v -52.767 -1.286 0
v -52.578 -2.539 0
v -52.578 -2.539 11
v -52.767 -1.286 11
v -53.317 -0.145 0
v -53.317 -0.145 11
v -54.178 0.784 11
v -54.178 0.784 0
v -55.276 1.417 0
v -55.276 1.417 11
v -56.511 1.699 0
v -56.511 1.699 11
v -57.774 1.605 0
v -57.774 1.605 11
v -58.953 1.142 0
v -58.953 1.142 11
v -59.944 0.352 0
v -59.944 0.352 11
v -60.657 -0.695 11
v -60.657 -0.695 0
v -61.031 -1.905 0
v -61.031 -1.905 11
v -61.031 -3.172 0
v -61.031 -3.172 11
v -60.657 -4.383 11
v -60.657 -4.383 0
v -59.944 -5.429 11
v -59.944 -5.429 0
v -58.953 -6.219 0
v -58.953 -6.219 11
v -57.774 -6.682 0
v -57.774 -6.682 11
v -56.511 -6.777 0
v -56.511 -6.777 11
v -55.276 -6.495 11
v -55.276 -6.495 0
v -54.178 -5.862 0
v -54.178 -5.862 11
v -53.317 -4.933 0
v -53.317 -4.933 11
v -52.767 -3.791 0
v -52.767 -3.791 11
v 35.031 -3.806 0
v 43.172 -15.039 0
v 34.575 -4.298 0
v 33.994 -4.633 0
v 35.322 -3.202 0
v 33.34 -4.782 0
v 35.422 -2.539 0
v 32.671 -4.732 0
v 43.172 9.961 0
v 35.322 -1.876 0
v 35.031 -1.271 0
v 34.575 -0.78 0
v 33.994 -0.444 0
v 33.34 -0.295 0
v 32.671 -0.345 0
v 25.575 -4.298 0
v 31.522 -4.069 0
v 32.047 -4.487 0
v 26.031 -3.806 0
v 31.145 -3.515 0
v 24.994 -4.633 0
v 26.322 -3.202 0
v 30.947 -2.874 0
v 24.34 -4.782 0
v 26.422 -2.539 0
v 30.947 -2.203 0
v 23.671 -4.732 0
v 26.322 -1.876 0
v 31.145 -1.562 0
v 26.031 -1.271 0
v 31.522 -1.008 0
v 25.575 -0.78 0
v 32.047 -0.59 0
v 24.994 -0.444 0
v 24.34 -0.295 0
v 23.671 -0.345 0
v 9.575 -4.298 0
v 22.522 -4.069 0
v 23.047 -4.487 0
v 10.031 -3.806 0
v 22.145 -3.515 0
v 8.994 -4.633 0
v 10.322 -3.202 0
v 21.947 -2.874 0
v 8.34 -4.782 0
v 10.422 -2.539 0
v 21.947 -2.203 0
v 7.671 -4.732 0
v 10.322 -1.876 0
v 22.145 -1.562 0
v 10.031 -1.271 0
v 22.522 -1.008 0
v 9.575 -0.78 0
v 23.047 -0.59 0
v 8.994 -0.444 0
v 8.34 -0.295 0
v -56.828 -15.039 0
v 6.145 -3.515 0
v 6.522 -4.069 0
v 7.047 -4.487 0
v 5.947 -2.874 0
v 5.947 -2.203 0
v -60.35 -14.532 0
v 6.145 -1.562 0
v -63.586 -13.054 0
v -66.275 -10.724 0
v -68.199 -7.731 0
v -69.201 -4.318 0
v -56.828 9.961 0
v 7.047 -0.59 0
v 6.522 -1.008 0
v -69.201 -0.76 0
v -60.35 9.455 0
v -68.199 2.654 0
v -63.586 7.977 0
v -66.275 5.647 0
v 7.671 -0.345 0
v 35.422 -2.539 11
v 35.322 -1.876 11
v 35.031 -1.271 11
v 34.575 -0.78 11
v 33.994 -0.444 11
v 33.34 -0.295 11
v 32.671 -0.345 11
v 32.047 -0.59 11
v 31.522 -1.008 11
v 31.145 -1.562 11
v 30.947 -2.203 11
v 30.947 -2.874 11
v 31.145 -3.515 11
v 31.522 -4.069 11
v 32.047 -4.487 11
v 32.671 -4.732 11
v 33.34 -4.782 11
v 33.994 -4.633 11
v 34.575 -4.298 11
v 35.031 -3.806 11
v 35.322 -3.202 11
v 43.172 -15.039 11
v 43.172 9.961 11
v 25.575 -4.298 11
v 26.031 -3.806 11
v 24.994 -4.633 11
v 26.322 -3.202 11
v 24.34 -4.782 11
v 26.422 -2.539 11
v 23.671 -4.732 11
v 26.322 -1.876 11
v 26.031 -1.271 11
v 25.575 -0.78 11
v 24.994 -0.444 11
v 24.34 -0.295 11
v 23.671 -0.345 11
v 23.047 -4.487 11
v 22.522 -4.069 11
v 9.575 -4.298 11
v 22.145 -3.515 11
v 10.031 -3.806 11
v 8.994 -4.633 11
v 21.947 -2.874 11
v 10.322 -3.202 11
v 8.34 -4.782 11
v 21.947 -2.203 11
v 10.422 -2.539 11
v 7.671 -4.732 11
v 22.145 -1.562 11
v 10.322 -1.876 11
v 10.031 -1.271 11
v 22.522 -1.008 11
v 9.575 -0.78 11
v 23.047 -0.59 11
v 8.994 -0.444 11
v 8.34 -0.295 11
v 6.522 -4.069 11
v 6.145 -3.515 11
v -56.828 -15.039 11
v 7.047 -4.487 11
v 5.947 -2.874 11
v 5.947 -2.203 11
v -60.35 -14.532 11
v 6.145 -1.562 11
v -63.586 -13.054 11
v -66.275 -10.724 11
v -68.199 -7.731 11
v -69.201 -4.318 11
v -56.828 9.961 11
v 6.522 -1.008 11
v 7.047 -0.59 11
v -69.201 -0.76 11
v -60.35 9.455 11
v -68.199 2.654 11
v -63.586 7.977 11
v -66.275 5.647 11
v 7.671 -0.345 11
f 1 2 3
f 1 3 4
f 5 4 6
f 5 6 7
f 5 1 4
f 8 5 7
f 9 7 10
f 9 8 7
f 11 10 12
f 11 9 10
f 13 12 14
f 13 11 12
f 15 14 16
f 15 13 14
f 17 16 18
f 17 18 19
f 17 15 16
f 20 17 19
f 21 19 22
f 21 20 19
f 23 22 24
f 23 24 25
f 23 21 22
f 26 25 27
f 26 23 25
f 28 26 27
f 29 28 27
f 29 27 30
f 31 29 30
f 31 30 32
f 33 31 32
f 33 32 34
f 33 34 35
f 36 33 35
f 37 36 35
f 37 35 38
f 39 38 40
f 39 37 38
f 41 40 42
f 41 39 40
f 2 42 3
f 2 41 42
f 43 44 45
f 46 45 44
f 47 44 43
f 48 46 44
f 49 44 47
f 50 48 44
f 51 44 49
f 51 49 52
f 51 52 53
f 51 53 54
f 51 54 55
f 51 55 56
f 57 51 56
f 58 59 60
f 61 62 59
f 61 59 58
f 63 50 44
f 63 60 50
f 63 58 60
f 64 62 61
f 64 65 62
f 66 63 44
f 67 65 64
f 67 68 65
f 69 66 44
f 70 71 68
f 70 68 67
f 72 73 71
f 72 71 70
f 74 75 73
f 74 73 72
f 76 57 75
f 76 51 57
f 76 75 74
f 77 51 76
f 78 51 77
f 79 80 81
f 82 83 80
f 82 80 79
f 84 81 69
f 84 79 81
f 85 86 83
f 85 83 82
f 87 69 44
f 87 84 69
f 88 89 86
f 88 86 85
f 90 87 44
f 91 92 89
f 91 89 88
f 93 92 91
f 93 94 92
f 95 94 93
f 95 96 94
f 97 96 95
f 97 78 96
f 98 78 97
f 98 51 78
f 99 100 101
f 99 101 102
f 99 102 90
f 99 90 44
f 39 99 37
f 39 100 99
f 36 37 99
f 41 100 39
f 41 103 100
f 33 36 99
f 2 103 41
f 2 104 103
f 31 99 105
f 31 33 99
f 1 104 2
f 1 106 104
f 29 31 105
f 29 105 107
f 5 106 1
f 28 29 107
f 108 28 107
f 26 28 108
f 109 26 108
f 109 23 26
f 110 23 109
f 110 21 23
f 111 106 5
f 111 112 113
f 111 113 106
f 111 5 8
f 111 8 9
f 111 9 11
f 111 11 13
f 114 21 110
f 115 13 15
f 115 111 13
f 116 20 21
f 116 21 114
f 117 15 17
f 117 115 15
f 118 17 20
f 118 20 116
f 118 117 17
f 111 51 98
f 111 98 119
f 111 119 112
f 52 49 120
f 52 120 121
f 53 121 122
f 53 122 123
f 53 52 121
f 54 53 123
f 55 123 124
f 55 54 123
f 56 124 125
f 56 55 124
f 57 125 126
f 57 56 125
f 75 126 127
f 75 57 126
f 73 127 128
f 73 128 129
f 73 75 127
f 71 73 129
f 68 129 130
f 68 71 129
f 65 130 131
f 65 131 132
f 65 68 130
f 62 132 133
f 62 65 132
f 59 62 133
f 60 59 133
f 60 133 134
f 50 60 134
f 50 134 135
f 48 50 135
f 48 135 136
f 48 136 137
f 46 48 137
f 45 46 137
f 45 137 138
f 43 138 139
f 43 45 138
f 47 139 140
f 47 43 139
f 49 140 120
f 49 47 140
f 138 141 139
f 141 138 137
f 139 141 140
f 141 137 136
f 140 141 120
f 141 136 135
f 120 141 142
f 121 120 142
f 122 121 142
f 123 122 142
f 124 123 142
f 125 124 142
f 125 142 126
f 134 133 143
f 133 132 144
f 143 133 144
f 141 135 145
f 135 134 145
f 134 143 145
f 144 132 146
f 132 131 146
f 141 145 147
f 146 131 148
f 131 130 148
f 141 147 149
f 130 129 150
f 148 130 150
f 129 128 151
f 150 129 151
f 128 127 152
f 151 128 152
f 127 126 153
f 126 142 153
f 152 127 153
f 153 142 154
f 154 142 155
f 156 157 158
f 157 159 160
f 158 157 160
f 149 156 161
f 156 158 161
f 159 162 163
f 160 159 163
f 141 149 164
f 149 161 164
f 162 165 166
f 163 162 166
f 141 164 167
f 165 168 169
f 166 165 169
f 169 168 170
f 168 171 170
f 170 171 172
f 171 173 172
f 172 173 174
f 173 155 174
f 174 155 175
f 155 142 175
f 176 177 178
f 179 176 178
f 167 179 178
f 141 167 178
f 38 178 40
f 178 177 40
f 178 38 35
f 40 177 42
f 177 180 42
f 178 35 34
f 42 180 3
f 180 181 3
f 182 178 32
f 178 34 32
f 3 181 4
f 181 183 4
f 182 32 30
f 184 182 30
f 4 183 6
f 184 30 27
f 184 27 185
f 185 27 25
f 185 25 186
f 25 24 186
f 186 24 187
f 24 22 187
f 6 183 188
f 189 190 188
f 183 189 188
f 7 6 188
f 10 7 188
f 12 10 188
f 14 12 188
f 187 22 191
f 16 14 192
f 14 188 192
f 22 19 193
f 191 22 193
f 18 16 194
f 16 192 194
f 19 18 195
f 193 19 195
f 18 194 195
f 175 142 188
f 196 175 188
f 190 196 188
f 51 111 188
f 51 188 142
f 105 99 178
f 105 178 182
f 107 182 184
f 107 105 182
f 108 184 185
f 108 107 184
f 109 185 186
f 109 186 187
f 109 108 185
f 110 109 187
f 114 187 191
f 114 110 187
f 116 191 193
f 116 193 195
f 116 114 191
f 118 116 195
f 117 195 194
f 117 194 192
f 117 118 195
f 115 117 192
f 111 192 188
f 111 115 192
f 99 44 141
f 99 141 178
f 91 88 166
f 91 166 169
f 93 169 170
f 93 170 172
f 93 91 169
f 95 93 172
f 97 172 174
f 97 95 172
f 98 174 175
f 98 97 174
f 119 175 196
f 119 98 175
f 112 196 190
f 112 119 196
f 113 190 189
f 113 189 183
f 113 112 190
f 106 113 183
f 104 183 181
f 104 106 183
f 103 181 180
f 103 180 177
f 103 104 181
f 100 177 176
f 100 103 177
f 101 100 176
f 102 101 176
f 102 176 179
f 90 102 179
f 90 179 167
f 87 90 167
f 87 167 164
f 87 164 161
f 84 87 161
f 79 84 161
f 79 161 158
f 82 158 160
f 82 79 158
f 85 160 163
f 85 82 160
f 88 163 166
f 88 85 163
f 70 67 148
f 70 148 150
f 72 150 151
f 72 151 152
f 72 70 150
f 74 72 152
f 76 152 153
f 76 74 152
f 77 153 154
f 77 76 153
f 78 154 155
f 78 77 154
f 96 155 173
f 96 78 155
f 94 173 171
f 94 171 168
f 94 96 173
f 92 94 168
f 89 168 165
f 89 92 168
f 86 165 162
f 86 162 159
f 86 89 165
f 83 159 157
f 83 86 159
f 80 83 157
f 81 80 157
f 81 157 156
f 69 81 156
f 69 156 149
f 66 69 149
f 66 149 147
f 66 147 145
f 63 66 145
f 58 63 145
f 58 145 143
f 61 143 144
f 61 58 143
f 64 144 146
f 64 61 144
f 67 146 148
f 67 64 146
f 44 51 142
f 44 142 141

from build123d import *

# Parameters (mm, degrees)
SKETCH_1_R      = 2.25
SKETCH_1_R_2    = 4.25
EXTRUDE_1_DEPTH = 11


with BuildPart() as part:
    # 草图1 → 凸台-拉伸1 (new body)
    with BuildSketch(Plane.XY):
        with BuildLine():
            Line((-56.82826087, 9.961271461), (43.17173913, 9.961271461))
            Line((43.17173913, 9.961271461), (43.17173913, -15.038728539))
            Line((43.17173913, -15.038728539), (-56.82826087, -15.038728539))
            ThreePointArc((-56.82826087, -15.038728539), (-69.32826087, -2.538728539), (-56.82826087, 9.961271461))
        make_face()
        with Locations((33.17173913, -2.538728539)):
            Circle(SKETCH_1_R, mode=Mode.SUBTRACT)
        with Locations((24.17173913, -2.538728539)):
            Circle(SKETCH_1_R, mode=Mode.SUBTRACT)
        with Locations((8.17173913, -2.538728539)):
            Circle(SKETCH_1_R, mode=Mode.SUBTRACT)
        with Locations((-56.82826087, -2.538728539)):
            Circle(SKETCH_1_R_2, mode=Mode.SUBTRACT)
    extrude(amount=EXTRUDE_1_DEPTH)


solid = part.part
